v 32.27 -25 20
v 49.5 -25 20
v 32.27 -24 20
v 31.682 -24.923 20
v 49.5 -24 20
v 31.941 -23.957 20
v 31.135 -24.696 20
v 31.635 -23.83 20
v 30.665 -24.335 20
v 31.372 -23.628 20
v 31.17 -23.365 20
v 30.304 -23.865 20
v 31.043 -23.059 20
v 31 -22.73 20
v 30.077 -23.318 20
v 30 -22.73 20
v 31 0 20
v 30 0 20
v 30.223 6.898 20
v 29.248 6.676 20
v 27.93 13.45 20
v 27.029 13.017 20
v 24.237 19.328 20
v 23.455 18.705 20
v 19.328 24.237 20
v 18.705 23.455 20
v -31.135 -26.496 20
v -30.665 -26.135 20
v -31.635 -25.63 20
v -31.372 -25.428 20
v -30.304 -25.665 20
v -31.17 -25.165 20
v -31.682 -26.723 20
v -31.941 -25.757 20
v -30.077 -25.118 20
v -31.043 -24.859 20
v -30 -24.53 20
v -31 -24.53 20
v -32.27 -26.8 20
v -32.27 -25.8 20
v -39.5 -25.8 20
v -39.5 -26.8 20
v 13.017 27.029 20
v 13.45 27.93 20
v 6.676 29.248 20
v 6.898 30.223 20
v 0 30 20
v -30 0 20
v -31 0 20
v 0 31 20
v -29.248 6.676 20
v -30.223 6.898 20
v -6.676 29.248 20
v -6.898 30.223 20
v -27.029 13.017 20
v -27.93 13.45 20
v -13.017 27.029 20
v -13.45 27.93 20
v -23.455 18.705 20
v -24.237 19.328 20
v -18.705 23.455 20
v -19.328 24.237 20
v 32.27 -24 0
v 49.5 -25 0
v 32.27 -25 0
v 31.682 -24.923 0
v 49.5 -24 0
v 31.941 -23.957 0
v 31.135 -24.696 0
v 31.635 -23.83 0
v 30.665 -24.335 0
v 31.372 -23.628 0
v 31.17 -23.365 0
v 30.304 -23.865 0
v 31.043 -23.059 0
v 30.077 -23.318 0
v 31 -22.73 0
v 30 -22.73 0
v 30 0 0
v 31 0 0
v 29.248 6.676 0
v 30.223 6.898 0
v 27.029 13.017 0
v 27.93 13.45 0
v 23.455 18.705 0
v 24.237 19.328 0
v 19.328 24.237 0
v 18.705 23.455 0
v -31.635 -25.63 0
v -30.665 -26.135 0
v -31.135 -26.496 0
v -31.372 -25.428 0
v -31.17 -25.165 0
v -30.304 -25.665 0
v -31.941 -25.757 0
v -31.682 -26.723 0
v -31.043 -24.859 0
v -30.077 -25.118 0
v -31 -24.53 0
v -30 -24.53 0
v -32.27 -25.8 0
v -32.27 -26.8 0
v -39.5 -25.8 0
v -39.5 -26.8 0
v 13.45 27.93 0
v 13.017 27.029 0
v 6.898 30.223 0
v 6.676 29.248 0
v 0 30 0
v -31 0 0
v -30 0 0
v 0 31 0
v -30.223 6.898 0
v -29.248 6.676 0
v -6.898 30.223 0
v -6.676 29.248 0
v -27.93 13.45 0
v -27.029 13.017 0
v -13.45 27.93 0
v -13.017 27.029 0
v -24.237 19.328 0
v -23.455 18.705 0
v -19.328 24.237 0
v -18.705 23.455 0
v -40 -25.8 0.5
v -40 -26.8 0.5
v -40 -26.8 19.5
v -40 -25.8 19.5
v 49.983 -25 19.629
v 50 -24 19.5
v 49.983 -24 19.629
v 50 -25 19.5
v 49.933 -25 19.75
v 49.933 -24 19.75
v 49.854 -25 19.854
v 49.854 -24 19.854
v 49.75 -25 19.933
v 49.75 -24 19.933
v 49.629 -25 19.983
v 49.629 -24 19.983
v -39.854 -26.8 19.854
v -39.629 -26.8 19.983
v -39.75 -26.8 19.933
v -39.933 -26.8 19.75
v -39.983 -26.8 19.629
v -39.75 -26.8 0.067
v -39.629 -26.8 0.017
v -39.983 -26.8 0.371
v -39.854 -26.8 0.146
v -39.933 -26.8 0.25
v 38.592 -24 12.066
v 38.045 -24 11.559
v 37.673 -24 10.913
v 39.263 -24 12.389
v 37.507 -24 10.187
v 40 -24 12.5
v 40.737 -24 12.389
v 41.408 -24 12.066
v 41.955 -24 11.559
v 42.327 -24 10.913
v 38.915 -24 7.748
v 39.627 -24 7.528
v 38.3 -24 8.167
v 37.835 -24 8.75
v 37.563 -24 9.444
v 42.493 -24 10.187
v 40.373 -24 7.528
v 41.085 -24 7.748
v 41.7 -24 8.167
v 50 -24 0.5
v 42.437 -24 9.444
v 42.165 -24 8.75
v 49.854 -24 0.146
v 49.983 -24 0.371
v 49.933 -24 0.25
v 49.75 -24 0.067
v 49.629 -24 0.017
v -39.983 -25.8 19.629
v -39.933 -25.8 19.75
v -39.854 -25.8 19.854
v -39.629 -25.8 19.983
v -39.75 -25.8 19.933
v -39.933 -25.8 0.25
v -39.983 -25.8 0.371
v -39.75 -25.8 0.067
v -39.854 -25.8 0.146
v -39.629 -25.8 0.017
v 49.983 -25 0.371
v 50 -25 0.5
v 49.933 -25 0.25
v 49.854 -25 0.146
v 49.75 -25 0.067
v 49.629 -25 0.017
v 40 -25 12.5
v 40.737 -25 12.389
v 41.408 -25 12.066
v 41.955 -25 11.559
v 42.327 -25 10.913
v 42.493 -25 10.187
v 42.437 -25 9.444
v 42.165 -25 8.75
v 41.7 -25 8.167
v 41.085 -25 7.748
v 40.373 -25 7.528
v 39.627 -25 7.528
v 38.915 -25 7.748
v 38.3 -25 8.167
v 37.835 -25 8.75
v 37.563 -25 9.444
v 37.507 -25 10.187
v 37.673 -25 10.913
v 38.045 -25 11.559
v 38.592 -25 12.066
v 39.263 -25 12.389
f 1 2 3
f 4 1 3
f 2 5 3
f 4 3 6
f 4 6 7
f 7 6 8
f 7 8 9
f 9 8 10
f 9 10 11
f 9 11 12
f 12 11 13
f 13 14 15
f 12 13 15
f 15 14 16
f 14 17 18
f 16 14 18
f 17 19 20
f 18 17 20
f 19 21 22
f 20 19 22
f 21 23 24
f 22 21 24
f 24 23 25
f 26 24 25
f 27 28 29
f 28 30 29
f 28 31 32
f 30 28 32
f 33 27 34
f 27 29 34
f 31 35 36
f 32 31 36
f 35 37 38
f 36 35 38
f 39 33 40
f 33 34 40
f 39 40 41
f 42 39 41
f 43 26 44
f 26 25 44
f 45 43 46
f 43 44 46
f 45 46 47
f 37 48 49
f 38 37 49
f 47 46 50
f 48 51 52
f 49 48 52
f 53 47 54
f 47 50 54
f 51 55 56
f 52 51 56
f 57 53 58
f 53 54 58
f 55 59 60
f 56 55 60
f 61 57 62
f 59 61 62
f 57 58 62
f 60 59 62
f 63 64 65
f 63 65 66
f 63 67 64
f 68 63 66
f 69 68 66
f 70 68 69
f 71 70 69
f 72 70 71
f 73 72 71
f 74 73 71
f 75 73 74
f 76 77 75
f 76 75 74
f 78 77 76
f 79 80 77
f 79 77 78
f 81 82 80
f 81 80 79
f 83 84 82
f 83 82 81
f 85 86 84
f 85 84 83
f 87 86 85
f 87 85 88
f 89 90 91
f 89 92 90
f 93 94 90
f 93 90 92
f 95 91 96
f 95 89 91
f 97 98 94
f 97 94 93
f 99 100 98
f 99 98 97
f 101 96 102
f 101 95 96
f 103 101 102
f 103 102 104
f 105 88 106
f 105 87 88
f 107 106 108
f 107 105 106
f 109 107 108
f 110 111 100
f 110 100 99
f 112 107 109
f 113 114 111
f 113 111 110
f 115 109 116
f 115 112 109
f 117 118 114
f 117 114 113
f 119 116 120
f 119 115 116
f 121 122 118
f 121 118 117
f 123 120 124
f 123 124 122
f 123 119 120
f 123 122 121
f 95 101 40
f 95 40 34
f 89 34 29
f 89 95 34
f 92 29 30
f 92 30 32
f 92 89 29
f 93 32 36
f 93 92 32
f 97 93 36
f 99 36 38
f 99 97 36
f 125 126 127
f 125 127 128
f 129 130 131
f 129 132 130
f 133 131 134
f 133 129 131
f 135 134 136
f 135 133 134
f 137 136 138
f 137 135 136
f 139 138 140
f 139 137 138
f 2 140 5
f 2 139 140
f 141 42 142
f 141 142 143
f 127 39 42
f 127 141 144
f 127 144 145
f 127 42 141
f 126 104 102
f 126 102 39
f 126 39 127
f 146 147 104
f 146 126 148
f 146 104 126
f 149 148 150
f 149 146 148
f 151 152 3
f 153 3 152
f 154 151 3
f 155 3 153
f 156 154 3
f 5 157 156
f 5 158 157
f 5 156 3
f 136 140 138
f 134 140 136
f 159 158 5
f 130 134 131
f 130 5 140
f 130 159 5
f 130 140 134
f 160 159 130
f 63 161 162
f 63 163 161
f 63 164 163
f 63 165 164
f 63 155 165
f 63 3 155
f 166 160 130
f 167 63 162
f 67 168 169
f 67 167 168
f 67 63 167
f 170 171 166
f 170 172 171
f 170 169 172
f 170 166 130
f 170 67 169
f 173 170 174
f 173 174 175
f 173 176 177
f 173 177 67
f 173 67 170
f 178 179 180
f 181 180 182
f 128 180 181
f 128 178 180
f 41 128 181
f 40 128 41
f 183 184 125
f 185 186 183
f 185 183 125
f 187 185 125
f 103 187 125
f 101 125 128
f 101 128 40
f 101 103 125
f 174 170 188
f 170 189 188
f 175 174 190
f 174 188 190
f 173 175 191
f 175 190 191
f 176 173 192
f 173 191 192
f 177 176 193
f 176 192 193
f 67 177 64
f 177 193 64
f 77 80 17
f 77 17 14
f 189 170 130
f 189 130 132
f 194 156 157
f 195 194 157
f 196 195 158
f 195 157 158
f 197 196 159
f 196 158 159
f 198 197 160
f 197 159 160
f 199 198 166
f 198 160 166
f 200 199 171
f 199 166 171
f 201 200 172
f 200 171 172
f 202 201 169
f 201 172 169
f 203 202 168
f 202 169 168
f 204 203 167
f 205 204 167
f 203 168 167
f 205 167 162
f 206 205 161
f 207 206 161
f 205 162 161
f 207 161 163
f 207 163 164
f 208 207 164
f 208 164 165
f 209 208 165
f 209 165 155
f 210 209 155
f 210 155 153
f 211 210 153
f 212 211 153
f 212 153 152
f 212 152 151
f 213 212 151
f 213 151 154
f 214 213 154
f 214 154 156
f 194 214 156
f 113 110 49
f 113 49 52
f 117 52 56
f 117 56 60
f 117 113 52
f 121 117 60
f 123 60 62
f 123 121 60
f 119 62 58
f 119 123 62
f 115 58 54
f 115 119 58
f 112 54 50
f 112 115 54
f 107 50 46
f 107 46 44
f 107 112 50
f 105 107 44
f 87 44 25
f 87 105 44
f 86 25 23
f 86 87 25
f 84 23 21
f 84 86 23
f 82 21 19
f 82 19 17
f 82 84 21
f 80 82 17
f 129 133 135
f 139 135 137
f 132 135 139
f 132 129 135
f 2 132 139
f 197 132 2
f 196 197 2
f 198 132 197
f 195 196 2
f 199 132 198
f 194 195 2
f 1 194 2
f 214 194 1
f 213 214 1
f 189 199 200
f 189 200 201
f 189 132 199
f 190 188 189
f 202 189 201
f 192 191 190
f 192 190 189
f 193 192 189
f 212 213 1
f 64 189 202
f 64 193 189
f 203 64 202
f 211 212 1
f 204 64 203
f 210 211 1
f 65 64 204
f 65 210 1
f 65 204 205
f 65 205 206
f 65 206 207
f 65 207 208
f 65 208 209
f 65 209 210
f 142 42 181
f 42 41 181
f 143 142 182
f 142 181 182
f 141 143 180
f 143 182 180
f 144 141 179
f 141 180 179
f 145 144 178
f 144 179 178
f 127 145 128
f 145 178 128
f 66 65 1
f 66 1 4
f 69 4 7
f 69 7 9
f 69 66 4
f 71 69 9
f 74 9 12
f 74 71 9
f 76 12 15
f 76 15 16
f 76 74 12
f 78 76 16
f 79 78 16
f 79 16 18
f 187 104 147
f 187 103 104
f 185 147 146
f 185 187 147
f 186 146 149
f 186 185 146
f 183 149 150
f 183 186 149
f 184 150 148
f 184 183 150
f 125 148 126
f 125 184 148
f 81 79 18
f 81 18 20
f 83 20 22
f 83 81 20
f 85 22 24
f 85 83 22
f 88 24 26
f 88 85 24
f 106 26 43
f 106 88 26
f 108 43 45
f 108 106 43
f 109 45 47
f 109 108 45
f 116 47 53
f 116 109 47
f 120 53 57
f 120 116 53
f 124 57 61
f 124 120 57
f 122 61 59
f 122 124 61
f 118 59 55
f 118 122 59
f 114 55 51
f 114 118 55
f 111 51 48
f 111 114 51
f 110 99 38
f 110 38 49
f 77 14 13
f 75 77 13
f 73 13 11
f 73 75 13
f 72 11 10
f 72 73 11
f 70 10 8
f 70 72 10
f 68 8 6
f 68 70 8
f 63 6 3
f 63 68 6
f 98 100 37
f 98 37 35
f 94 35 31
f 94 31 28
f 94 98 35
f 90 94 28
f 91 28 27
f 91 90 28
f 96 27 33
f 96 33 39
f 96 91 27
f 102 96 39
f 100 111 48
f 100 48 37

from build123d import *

# Parameters (mm, degrees)
BASE_FLANGE1_DEPTH = 20
SKETCH6_R          = 2.5
CUT_EXTRUDE1_DEPTH = 10
FILLET1_R          = 0.5


# Sheet-metal steps are written as plain solids
with BuildPart() as part:
    # Sketch1 → Base-Flange1 (new body)
    with BuildSketch(Plane.XY):
        with BuildLine():
            Line((50, -25), (32.27, -25))
            ThreePointArc((32.27, -25), (30.664867607, -24.335132393), (30, -22.73))
            Line((30, -22.73), (30, 0))
            ThreePointArc((30, 0), (0, 30), (-30, 0))
            Line((-30, 0), (-30, -24.53))
            ThreePointArc((-30, -24.53), (-30.664867607, -26.135132393), (-32.27, -26.8))
            Line((-32.27, -26.8), (-40, -26.8))
            Line((-40, -26.8), (-40, -25.8))
            Line((-40, -25.8), (-32.27, -25.8))
            ThreePointArc((-32.27, -25.8), (-31.371974388, -25.428025612), (-31, -24.53))
            Line((-31, -24.53), (-31, 0))
            ThreePointArc((-31, 0), (0, 31), (31, 0))
            Line((31, 0), (31, -22.73))
            ThreePointArc((31, -22.73), (31.371974388, -23.628025612), (32.27, -24))
            Line((32.27, -24), (50, -24))
            Line((50, -24), (50, -25))
        make_face()
    extrude(amount=BASE_FLANGE1_DEPTH)

    # Sketch6 → Cut-Extrude1 (cut)
    with BuildSketch(Plane(origin=(0, -24, 0), x_dir=(1, 0, 0), z_dir=(0, 1, 0))):
        with Locations(Location((40, -10, 0), (0, 0, 270))):
            Circle(SKETCH6_R)
    extrude(amount=-CUT_EXTRUDE1_DEPTH, mode=Mode.SUBTRACT)

    # Fillet1
    fillet1_edges = [part.edges().sort_by_distance(p)[0] for p in [
        (50, -24.5, 0),
        (-40, -26.3, 0),
        (50, -24.5, 20),
        (-40, -26.3, 20),
    ]]
    fillet(fillet1_edges, radius=FILLET1_R)


solid = part.part
